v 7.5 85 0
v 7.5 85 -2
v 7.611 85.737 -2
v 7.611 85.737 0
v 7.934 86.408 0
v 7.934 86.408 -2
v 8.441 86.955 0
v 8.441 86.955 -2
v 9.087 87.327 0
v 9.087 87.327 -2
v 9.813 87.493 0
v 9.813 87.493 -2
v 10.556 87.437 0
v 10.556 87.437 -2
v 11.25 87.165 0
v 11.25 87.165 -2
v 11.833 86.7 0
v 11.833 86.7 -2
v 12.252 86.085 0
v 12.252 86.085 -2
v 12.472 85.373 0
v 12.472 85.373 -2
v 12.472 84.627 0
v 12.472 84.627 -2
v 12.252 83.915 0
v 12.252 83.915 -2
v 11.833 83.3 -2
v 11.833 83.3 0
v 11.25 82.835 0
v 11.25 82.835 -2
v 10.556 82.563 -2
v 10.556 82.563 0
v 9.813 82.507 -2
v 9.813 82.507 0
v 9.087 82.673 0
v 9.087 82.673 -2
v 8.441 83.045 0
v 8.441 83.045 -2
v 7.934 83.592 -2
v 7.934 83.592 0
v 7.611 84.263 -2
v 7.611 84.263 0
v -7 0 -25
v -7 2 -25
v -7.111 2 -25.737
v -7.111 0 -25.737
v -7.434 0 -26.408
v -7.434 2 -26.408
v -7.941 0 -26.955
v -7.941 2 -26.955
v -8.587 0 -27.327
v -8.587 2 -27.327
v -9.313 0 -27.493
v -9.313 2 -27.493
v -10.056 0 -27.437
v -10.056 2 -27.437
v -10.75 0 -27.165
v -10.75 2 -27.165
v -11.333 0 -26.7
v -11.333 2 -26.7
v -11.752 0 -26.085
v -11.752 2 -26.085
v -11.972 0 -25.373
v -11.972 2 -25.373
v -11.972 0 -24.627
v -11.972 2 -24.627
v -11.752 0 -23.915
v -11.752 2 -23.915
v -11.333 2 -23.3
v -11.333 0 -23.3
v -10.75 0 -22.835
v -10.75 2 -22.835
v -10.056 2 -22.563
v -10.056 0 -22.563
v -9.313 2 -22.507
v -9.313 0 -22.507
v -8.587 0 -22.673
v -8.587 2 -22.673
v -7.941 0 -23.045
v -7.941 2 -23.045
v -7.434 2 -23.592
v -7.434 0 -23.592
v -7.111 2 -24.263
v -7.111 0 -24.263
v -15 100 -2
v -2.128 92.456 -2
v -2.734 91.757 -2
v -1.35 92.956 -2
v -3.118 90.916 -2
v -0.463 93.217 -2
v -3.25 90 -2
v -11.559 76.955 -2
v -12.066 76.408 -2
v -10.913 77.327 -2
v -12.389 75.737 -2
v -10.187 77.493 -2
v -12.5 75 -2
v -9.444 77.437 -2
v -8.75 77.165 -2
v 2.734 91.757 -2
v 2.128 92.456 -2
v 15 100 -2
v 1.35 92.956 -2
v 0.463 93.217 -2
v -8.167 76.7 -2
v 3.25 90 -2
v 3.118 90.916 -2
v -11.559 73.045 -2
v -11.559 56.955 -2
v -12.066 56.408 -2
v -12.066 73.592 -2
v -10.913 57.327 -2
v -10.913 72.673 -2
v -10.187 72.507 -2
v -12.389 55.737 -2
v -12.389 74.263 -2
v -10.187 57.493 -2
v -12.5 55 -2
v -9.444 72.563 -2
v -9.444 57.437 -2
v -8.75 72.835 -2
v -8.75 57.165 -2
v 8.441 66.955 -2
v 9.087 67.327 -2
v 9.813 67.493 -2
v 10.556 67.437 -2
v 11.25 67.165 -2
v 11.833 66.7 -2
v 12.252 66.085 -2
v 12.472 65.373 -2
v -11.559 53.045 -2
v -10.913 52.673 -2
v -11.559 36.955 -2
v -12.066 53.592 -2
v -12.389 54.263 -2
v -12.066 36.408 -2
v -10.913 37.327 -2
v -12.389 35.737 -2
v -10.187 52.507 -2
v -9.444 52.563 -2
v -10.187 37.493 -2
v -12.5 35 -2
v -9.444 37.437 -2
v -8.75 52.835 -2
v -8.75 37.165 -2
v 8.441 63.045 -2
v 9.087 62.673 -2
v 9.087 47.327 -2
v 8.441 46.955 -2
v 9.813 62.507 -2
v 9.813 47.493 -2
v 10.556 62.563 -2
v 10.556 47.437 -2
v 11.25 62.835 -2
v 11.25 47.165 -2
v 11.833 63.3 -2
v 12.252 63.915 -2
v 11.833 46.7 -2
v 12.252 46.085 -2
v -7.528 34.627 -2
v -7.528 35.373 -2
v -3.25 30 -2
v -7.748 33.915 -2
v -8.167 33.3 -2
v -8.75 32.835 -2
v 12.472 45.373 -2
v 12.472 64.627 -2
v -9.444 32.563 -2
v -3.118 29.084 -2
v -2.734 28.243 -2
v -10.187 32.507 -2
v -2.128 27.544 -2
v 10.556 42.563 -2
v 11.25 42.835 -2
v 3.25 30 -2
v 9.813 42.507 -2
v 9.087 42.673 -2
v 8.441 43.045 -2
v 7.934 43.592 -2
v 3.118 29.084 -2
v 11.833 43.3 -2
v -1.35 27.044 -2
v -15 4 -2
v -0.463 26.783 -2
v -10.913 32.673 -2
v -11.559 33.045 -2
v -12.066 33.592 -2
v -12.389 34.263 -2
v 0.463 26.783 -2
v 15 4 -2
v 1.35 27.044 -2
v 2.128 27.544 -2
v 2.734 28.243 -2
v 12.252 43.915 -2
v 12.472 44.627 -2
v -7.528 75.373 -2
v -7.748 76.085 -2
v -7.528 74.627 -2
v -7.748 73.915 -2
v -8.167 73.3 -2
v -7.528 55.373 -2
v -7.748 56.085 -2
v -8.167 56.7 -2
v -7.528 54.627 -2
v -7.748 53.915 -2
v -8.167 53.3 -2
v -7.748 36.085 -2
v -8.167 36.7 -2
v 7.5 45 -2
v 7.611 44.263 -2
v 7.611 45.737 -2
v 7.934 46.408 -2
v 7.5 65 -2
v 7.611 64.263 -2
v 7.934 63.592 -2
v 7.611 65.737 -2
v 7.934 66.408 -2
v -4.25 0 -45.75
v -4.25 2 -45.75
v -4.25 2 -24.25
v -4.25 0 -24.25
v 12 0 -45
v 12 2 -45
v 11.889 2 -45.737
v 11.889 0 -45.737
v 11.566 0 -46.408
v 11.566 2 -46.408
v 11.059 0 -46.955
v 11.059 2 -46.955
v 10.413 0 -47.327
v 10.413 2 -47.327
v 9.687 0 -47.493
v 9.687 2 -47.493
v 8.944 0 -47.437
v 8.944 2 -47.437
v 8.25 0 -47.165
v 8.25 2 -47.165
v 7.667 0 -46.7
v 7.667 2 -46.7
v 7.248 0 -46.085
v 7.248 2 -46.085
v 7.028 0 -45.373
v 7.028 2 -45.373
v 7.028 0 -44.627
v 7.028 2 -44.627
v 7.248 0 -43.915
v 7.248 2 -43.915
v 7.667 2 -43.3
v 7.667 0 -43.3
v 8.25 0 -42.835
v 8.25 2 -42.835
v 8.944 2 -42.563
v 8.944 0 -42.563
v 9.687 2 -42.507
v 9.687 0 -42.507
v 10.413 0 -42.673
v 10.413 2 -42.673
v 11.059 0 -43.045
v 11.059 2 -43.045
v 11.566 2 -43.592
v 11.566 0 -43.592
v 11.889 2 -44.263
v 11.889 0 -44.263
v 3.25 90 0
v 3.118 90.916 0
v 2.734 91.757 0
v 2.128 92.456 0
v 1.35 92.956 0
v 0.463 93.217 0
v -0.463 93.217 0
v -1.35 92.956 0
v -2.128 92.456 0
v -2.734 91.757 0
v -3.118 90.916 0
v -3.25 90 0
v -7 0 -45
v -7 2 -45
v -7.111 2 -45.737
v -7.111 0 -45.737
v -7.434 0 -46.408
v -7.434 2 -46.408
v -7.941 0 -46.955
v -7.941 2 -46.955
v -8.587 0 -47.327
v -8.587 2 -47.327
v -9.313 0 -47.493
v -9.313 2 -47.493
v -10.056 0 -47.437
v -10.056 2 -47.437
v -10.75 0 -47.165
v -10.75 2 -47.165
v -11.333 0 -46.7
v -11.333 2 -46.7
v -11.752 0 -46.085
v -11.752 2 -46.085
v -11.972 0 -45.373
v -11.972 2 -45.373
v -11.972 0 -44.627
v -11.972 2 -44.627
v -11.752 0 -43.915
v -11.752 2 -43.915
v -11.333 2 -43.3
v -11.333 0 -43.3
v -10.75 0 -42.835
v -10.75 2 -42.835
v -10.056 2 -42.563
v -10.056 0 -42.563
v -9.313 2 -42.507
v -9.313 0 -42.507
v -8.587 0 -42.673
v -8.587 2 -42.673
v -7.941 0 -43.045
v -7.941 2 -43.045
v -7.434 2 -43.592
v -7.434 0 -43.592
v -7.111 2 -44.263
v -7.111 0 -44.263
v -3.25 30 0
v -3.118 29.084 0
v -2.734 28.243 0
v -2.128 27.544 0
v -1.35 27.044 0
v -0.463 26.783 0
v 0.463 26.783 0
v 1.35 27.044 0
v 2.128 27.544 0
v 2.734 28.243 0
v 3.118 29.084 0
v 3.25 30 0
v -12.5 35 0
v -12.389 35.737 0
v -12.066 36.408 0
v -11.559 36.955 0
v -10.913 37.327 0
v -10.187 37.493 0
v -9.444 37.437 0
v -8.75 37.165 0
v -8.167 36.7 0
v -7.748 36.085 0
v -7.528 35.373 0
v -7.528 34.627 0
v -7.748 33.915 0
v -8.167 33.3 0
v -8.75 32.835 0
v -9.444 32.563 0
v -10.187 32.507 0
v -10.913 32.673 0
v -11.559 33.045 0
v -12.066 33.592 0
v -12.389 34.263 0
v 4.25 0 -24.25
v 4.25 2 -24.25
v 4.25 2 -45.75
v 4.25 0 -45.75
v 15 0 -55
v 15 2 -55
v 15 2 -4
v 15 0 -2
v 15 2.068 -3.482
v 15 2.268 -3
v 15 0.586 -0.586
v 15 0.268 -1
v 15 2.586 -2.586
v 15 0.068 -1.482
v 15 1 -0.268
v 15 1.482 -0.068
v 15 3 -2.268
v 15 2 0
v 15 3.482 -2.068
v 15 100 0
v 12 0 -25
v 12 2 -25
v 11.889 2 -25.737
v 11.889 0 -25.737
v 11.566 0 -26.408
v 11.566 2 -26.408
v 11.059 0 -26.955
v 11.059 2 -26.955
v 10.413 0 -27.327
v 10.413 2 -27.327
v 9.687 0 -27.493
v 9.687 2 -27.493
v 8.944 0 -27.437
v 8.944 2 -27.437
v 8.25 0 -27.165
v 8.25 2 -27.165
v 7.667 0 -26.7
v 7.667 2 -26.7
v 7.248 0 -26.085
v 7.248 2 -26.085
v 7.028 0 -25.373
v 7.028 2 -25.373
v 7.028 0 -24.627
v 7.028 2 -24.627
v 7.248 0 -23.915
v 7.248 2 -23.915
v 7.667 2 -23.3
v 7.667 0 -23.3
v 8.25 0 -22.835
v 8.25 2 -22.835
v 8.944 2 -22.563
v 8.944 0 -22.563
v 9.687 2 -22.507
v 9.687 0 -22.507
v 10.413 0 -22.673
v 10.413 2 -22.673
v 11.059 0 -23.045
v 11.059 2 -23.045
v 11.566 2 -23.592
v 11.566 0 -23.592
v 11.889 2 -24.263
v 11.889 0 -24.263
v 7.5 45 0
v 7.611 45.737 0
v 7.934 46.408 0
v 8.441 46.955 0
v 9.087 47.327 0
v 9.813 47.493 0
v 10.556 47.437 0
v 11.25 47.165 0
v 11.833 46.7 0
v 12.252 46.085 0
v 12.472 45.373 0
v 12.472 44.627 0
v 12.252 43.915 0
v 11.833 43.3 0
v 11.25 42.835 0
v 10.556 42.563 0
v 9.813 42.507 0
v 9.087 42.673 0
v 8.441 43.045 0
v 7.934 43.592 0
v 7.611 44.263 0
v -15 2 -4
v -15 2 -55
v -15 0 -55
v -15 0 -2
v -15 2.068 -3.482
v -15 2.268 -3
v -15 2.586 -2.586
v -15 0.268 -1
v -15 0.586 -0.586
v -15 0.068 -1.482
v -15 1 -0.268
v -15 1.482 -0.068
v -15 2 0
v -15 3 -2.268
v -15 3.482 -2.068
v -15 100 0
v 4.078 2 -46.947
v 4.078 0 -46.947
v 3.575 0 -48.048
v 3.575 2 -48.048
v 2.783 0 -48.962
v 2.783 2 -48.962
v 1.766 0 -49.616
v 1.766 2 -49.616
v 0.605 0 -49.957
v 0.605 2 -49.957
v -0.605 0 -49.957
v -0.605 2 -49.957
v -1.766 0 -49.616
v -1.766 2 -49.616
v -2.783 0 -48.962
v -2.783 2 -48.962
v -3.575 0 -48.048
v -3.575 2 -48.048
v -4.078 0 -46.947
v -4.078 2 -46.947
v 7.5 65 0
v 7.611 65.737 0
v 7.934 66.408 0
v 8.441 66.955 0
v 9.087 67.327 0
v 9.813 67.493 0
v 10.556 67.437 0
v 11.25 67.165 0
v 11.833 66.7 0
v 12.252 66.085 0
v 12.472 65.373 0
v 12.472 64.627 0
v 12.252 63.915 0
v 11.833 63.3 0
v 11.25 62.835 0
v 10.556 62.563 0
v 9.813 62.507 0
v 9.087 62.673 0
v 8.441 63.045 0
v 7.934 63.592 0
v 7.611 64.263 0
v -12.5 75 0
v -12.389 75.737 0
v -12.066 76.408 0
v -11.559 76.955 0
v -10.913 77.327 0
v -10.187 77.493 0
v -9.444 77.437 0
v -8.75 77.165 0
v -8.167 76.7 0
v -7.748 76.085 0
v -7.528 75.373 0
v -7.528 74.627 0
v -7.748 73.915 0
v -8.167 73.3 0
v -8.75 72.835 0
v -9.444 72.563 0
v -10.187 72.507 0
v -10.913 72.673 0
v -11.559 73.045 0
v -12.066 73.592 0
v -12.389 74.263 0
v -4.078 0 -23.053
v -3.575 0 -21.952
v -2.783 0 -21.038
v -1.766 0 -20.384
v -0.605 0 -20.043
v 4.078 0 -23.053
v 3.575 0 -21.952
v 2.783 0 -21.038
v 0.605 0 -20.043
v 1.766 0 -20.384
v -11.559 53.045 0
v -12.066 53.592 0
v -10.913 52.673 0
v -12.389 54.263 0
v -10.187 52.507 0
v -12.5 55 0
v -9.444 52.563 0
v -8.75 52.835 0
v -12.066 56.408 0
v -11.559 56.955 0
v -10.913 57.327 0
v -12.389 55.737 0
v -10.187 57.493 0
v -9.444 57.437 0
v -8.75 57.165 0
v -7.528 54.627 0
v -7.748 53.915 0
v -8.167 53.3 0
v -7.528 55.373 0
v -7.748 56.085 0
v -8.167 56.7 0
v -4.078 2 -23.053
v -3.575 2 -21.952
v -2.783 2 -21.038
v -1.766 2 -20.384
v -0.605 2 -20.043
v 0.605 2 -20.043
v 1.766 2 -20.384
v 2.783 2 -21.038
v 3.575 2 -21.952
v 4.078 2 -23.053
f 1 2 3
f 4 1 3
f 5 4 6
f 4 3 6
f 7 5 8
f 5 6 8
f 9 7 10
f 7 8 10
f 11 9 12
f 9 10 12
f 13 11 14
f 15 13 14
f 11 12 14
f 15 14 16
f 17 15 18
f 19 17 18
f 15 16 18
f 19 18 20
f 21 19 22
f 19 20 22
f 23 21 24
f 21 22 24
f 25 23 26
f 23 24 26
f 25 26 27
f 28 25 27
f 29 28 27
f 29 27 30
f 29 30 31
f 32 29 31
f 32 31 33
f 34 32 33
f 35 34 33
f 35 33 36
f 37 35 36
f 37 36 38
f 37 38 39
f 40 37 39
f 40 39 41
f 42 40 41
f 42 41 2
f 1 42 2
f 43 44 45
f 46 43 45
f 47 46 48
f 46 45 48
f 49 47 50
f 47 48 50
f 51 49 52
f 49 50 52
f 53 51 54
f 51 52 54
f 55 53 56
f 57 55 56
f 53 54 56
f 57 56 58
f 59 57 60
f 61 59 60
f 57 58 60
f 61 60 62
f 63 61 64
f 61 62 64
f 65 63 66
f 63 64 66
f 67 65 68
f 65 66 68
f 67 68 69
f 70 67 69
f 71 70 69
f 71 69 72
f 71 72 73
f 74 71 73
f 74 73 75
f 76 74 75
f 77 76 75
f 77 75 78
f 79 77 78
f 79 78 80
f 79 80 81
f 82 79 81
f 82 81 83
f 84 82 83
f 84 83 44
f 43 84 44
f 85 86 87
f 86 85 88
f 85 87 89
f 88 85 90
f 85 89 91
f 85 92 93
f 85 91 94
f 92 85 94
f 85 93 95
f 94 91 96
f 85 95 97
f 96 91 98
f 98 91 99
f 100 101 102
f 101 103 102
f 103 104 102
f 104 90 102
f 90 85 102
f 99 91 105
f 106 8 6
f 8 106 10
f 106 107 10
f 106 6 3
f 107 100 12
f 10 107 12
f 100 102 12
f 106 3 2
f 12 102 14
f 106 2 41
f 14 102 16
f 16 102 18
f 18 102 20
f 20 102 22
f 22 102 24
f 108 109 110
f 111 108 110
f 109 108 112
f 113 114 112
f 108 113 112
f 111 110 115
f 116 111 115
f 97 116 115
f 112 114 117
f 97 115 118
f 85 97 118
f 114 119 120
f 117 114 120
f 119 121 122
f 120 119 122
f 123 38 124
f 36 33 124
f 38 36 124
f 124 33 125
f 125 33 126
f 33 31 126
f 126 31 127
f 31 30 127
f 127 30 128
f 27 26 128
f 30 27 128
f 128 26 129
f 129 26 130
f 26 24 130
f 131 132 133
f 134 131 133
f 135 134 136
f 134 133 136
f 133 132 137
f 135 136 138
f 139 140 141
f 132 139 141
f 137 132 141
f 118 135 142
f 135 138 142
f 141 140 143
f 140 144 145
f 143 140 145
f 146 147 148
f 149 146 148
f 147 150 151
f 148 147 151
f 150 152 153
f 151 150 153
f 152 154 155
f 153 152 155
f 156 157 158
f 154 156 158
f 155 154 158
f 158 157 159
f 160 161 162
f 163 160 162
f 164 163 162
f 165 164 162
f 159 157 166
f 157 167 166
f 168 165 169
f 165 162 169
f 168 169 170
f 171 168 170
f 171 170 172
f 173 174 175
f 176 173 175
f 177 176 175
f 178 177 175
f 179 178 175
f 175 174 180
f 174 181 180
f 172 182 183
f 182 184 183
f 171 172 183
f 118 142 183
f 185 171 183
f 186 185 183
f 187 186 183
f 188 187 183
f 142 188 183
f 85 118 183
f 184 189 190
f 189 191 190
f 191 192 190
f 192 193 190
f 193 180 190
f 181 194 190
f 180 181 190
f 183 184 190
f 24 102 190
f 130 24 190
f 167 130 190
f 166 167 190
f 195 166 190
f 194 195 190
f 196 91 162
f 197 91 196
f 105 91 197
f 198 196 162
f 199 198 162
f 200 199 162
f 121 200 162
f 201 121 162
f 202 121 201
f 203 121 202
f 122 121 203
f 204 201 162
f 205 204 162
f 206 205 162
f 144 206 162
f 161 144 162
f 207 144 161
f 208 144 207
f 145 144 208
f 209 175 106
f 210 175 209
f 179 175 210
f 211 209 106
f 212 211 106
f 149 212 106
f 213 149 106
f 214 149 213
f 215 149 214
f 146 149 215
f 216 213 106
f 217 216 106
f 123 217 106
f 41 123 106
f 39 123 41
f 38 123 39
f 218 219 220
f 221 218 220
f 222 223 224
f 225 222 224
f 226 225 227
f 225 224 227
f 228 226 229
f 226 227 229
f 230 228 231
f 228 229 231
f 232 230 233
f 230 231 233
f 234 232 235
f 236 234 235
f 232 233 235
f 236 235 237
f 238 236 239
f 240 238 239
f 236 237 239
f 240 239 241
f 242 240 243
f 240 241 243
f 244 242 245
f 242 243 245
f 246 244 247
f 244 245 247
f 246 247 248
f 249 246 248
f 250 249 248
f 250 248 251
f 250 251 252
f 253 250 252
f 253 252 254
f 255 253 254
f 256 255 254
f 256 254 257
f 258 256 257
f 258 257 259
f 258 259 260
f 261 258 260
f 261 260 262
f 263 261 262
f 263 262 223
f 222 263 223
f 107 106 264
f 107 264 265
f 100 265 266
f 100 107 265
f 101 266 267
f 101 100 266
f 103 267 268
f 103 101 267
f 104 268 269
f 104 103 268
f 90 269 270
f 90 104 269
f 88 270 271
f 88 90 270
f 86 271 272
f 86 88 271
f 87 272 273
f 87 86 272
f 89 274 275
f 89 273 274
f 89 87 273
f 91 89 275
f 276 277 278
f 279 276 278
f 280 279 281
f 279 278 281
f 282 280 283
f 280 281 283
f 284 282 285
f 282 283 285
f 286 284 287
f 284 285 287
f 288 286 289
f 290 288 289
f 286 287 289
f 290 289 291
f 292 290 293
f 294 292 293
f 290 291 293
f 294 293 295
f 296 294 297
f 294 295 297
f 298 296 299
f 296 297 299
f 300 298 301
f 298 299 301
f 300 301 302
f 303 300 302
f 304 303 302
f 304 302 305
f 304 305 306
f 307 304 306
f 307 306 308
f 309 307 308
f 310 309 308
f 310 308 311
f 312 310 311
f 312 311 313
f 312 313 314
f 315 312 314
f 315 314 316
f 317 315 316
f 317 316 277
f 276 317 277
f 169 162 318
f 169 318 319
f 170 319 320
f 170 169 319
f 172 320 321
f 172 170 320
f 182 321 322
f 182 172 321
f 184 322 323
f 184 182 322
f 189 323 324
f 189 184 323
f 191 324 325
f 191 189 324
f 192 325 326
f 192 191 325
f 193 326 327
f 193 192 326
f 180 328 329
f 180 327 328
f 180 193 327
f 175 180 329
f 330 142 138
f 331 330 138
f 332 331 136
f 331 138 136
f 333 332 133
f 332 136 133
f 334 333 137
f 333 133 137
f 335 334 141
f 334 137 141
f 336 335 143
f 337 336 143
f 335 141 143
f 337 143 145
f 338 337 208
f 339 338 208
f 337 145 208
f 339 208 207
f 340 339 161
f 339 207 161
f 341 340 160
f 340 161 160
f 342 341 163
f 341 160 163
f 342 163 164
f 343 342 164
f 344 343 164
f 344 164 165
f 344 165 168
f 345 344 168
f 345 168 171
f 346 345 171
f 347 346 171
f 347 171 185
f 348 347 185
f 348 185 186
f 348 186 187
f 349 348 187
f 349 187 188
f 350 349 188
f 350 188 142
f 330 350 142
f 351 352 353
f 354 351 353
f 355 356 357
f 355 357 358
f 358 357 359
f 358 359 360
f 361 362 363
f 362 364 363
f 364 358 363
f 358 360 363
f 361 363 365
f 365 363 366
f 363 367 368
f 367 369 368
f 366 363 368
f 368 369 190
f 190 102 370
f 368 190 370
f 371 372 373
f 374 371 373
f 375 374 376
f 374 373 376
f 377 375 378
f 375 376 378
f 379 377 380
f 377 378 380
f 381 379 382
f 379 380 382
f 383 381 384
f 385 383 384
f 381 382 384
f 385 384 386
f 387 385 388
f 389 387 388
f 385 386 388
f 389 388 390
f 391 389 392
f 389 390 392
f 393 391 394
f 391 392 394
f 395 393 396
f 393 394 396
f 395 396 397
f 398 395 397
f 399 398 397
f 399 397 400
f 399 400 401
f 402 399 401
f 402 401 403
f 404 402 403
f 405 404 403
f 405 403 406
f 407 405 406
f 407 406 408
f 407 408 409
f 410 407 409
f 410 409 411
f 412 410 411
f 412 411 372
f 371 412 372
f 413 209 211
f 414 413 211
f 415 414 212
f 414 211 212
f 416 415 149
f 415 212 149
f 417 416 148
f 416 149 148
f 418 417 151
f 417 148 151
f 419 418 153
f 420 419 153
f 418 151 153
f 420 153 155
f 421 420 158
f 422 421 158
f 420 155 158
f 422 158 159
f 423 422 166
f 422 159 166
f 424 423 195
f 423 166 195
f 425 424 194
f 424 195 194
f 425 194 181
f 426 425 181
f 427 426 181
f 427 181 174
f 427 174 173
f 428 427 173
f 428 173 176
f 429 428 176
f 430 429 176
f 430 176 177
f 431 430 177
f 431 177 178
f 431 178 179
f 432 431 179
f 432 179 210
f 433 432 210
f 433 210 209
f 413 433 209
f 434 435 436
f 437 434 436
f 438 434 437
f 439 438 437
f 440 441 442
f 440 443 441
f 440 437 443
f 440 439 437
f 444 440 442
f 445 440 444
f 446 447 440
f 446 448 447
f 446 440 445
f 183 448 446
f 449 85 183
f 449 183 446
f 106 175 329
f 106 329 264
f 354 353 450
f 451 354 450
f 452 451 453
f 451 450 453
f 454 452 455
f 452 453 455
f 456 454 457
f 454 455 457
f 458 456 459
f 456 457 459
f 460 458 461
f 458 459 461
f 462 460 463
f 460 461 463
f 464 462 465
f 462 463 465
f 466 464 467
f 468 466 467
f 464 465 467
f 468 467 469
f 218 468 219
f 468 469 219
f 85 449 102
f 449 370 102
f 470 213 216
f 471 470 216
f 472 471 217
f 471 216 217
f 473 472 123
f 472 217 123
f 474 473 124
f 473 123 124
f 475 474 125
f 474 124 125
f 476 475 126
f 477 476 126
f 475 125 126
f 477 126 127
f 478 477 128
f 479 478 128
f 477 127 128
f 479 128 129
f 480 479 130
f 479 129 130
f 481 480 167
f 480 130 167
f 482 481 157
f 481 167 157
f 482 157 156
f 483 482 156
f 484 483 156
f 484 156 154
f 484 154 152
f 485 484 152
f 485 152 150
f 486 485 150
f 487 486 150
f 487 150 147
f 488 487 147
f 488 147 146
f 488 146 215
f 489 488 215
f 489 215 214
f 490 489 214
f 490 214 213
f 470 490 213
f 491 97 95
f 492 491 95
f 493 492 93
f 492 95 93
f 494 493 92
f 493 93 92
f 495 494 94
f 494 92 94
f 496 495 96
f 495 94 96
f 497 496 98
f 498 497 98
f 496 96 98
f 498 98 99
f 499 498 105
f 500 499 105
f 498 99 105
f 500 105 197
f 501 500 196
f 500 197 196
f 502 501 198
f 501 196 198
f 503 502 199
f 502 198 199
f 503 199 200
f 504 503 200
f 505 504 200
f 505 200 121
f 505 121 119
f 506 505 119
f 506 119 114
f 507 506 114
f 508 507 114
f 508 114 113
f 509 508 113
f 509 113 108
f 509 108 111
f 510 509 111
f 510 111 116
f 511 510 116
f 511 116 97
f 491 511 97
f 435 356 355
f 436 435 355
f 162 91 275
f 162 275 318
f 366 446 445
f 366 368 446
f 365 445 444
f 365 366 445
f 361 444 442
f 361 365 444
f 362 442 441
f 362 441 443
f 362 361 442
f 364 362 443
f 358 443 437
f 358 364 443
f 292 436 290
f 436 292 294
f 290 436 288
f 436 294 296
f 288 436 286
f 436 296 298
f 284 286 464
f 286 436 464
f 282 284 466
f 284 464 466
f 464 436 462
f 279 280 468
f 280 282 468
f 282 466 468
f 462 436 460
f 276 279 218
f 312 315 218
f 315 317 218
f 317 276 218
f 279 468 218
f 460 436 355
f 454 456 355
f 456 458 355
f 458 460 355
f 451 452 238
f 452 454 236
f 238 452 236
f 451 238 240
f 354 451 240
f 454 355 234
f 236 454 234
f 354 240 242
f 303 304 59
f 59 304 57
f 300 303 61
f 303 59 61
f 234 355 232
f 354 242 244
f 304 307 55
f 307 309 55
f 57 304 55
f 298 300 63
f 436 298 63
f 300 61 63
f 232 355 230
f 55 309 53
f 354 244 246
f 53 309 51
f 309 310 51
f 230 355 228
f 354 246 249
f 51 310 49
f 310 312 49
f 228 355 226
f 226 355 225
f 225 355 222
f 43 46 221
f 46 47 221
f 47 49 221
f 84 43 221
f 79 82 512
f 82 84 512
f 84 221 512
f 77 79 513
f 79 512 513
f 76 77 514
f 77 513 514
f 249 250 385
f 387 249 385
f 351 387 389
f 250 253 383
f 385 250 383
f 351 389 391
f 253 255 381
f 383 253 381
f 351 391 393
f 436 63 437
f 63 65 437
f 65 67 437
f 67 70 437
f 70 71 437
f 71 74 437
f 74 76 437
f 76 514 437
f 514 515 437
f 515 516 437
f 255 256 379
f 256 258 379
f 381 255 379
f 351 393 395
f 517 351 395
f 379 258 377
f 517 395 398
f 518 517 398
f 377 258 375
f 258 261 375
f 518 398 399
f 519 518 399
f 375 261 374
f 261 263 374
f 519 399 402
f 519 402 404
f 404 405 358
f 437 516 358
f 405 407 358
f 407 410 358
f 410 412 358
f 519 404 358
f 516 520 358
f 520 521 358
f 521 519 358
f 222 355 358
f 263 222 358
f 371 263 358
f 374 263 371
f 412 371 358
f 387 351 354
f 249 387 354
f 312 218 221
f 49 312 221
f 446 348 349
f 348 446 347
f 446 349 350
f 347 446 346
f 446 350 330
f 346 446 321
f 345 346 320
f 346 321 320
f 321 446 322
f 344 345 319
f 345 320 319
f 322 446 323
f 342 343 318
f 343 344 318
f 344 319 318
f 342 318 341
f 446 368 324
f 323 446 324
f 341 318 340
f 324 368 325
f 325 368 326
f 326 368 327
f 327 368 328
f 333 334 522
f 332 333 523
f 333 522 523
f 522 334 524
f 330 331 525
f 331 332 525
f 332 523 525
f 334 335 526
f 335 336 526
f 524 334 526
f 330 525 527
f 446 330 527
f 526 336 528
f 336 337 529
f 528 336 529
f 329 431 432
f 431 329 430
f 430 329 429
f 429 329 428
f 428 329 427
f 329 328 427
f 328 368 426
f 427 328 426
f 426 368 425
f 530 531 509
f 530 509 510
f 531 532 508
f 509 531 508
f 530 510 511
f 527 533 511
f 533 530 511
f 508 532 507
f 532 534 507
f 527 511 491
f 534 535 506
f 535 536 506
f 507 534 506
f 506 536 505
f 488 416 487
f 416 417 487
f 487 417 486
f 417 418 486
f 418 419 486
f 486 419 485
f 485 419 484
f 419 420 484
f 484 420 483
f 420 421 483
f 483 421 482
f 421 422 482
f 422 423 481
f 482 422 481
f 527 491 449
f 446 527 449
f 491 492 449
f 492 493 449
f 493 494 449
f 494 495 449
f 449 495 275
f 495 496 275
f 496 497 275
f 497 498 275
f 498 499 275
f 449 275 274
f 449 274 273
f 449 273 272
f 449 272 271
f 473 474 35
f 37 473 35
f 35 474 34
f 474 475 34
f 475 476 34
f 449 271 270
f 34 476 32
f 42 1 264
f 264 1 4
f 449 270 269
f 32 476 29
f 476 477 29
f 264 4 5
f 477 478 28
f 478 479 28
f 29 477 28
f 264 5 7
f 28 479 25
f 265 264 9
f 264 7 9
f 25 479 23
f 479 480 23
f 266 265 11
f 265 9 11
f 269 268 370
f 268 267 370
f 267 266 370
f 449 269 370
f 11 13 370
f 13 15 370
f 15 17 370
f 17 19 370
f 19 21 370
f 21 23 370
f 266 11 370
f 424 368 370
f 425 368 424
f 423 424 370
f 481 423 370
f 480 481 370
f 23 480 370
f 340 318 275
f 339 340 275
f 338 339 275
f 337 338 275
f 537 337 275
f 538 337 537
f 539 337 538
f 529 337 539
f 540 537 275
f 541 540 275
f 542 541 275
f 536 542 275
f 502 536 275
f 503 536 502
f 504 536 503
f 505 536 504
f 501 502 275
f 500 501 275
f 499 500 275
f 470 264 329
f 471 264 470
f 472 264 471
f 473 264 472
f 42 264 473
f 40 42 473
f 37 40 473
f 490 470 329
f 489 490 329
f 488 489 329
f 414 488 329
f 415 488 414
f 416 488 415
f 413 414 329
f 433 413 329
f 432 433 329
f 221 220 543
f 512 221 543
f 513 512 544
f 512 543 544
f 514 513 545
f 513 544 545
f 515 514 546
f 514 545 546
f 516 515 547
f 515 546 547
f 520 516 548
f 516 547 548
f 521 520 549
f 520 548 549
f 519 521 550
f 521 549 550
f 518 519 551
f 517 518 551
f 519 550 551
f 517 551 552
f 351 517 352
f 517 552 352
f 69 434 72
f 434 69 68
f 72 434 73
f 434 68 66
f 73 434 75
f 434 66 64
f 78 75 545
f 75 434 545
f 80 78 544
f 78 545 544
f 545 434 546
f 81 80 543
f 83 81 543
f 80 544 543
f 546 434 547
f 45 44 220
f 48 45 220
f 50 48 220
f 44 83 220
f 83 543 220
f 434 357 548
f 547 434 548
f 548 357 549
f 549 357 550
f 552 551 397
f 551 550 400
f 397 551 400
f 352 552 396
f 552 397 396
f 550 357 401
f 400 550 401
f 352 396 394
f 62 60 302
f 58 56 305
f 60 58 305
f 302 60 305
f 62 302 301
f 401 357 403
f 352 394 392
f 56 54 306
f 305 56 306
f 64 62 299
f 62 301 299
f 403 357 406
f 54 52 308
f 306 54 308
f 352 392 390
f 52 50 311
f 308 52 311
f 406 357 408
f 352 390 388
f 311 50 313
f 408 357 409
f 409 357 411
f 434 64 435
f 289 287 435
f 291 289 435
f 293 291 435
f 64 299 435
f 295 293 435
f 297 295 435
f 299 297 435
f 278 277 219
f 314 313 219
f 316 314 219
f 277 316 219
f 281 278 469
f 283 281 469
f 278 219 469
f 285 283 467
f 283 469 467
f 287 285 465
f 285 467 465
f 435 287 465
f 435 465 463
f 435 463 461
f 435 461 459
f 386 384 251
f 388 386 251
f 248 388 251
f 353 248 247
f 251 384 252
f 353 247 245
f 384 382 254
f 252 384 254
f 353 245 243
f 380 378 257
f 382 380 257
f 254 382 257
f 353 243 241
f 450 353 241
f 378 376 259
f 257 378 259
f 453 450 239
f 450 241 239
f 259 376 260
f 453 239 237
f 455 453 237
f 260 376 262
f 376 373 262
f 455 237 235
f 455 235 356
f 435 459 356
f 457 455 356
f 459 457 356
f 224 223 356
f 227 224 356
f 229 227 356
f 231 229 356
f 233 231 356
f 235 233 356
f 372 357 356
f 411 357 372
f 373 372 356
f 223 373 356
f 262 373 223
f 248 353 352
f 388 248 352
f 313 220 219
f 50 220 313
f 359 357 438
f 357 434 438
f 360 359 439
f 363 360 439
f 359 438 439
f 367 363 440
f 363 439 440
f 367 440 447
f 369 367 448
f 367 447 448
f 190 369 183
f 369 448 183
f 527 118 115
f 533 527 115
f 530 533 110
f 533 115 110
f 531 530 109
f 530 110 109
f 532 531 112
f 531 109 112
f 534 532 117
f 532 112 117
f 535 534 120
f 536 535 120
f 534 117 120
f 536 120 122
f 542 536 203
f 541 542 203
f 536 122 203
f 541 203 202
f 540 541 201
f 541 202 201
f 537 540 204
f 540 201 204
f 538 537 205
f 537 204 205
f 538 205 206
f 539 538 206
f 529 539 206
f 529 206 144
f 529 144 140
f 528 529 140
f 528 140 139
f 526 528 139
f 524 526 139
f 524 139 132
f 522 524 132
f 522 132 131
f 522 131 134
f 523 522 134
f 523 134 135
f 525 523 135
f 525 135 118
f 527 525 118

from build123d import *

# Parameters (mm, degrees)
BOSS_EXTRU_1_DEPTH      = 15
CONG_1_R                = 2
ENL_V_MAT_EXTRU_1_REACH = 4
ESQUISSE2_R             = 2.5
ENL_V_MAT_EXTRU_2_REACH = 4
ESQUISSE4_R             = 2.5


with BuildPart() as part:
    # Esquisse1 → Boss.-Extru.1 (new body, symmetric)
    with BuildSketch(Plane(origin=(0, 0, 0), x_dir=(0, 0, -1), z_dir=(1, 0, 0))):
        Polygon((0, 0), (0, 100), (2, 100), (2, 2), (55, 2), (55, 0), align=None)
    extrude(amount=BOSS_EXTRU_1_DEPTH, both=True)

    # Congé1
    cong_1_edges = [part.edges().sort_by_distance(p)[0] for p in [
        (0, 0, 0),
        (0, 2, -2),
    ]]
    fillet(cong_1_edges, radius=CONG_1_R)

    # Esquisse2 → Enlèv. mat.-Extru.1 (cut, up to next)
    with BuildSketch(Plane(origin=(0, 2, 0), x_dir=(1, 0, 0), z_dir=(0, 1, 0)), mode=Mode.PRIVATE) as enl_v_mat_extru_1_sk1:
        with BuildLine():
            Line((4.25, 24.25), (4.25, 45.75))
            ThreePointArc((4.25, 45.75), (0, 50), (-4.25, 45.75))
            Line((-4.25, 45.75), (-4.25, 24.25))
            ThreePointArc((-4.25, 24.25), (0, 20), (4.25, 24.25))
        make_face()
    enl_v_mat_extru_1_tool1 = extrude(enl_v_mat_extru_1_sk1.sketch, amount=-ENL_V_MAT_EXTRU_1_REACH, mode=Mode.PRIVATE) & part.part
    add(enl_v_mat_extru_1_tool1.solids().sort_by_distance((0, 2, -35))[0], mode=Mode.SUBTRACT)
    # Esquisse2 → Enlèv. mat.-Extru.1 (cut, up to next)
    with BuildSketch(Plane(origin=(0, 2, 0), x_dir=(1, 0, 0), z_dir=(0, 1, 0)), mode=Mode.PRIVATE) as enl_v_mat_extru_1_sk2:
        with Locations((-9.5, 25)):
            Circle(ESQUISSE2_R)
    enl_v_mat_extru_1_tool2 = extrude(enl_v_mat_extru_1_sk2.sketch, amount=-ENL_V_MAT_EXTRU_1_REACH, mode=Mode.PRIVATE) & part.part
    add(enl_v_mat_extru_1_tool2.solids().sort_by_distance((-9.5, 2, -25))[0], mode=Mode.SUBTRACT)
    # Esquisse2 → Enlèv. mat.-Extru.1 (cut, up to next)
    with BuildSketch(Plane(origin=(0, 2, 0), x_dir=(1, 0, 0), z_dir=(0, 1, 0)), mode=Mode.PRIVATE) as enl_v_mat_extru_1_sk3:
        with Locations((-9.5, 45)):
            Circle(ESQUISSE2_R)
    enl_v_mat_extru_1_tool3 = extrude(enl_v_mat_extru_1_sk3.sketch, amount=-ENL_V_MAT_EXTRU_1_REACH, mode=Mode.PRIVATE) & part.part
    add(enl_v_mat_extru_1_tool3.solids().sort_by_distance((-9.5, 2, -45))[0], mode=Mode.SUBTRACT)
    # Esquisse2 → Enlèv. mat.-Extru.1 (cut, up to next)
    with BuildSketch(Plane(origin=(0, 2, 0), x_dir=(1, 0, 0), z_dir=(0, 1, 0)), mode=Mode.PRIVATE) as enl_v_mat_extru_1_sk4:
        with Locations((9.5, 45)):
            Circle(ESQUISSE2_R)
    enl_v_mat_extru_1_tool4 = extrude(enl_v_mat_extru_1_sk4.sketch, amount=-ENL_V_MAT_EXTRU_1_REACH, mode=Mode.PRIVATE) & part.part
    add(enl_v_mat_extru_1_tool4.solids().sort_by_distance((9.5, 2, -45))[0], mode=Mode.SUBTRACT)
    # Esquisse2 → Enlèv. mat.-Extru.1 (cut, up to next)
    with BuildSketch(Plane(origin=(0, 2, 0), x_dir=(1, 0, 0), z_dir=(0, 1, 0)), mode=Mode.PRIVATE) as enl_v_mat_extru_1_sk5:
        with Locations((9.5, 25)):
            Circle(ESQUISSE2_R)
    enl_v_mat_extru_1_tool5 = extrude(enl_v_mat_extru_1_sk5.sketch, amount=-ENL_V_MAT_EXTRU_1_REACH, mode=Mode.PRIVATE) & part.part
    add(enl_v_mat_extru_1_tool5.solids().sort_by_distance((9.5, 2, -25))[0], mode=Mode.SUBTRACT)

    # Esquisse4 → Enlèv. mat.-Extru.2 (cut, up to next)
    with BuildSketch(Plane(origin=(0, 0, -2), x_dir=(-1, 0, 0), z_dir=(0, 0, -1)), mode=Mode.PRIVATE) as enl_v_mat_extru_2_sk1:
        with Locations((-10, 85)):
            Circle(ESQUISSE4_R)
    enl_v_mat_extru_2_tool1 = extrude(enl_v_mat_extru_2_sk1.sketch, amount=-ENL_V_MAT_EXTRU_2_REACH, mode=Mode.PRIVATE) & part.part
    add(enl_v_mat_extru_2_tool1.solids().sort_by_distance((10, 85, -2))[0], mode=Mode.SUBTRACT)
    # Esquisse4 → Enlèv. mat.-Extru.2 (cut, up to next)
    with BuildSketch(Plane(origin=(0, 0, -2), x_dir=(-1, 0, 0), z_dir=(0, 0, -1)), mode=Mode.PRIVATE) as enl_v_mat_extru_2_sk2:
        with Locations((-10, 65)):
            Circle(ESQUISSE4_R)
    enl_v_mat_extru_2_tool2 = extrude(enl_v_mat_extru_2_sk2.sketch, amount=-ENL_V_MAT_EXTRU_2_REACH, mode=Mode.PRIVATE) & part.part
    add(enl_v_mat_extru_2_tool2.solids().sort_by_distance((10, 65, -2))[0], mode=Mode.SUBTRACT)
    # Esquisse4 → Enlèv. mat.-Extru.2 (cut, up to next)
    with BuildSketch(Plane(origin=(0, 0, -2), x_dir=(-1, 0, 0), z_dir=(0, 0, -1)), mode=Mode.PRIVATE) as enl_v_mat_extru_2_sk3:
        with Locations((-10, 45)):
            Circle(ESQUISSE4_R)
    enl_v_mat_extru_2_tool3 = extrude(enl_v_mat_extru_2_sk3.sketch, amount=-ENL_V_MAT_EXTRU_2_REACH, mode=Mode.PRIVATE) & part.part
    add(enl_v_mat_extru_2_tool3.solids().sort_by_distance((10, 45, -2))[0], mode=Mode.SUBTRACT)
    # Esquisse4 → Enlèv. mat.-Extru.2 (cut, up to next)
    with BuildSketch(Plane(origin=(0, 0, -2), x_dir=(-1, 0, 0), z_dir=(0, 0, -1)), mode=Mode.PRIVATE) as enl_v_mat_extru_2_sk4:
        with Locations((10, 75)):
            Circle(ESQUISSE4_R)
    enl_v_mat_extru_2_tool4 = extrude(enl_v_mat_extru_2_sk4.sketch, amount=-ENL_V_MAT_EXTRU_2_REACH, mode=Mode.PRIVATE) & part.part
    add(enl_v_mat_extru_2_tool4.solids().sort_by_distance((-10, 75, -2))[0], mode=Mode.SUBTRACT)
    # Esquisse4 → Enlèv. mat.-Extru.2 (cut, up to next)
    with BuildSketch(Plane(origin=(0, 0, -2), x_dir=(-1, 0, 0), z_dir=(0, 0, -1)), mode=Mode.PRIVATE) as enl_v_mat_extru_2_sk5:
        with Locations((10, 55)):
            Circle(ESQUISSE4_R)
    enl_v_mat_extru_2_tool5 = extrude(enl_v_mat_extru_2_sk5.sketch, amount=-ENL_V_MAT_EXTRU_2_REACH, mode=Mode.PRIVATE) & part.part
    add(enl_v_mat_extru_2_tool5.solids().sort_by_distance((-10, 55, -2))[0], mode=Mode.SUBTRACT)
    # Esquisse4 → Enlèv. mat.-Extru.2 (cut, up to next)
    with BuildSketch(Plane(origin=(0, 0, -2), x_dir=(-1, 0, 0), z_dir=(0, 0, -1)), mode=Mode.PRIVATE) as enl_v_mat_extru_2_sk6:
        with Locations((10, 35)):
            Circle(ESQUISSE4_R)
    enl_v_mat_extru_2_tool6 = extrude(enl_v_mat_extru_2_sk6.sketch, amount=-ENL_V_MAT_EXTRU_2_REACH, mode=Mode.PRIVATE) & part.part
    add(enl_v_mat_extru_2_tool6.solids().sort_by_distance((-10, 35, -2))[0], mode=Mode.SUBTRACT)
    # Esquisse4 → Enlèv. mat.-Extru.2 (cut, up to next)
    with BuildSketch(Plane(origin=(0, 0, -2), x_dir=(-1, 0, 0), z_dir=(0, 0, -1)), mode=Mode.PRIVATE) as enl_v_mat_extru_2_sk7:
        with BuildLine():
            Line((3.25, 90), (3.25, 30))
            ThreePointArc((3.25, 30), (0, 26.75), (-3.25, 30))
            Line((-3.25, 30), (-3.25, 90))
            ThreePointArc((-3.25, 90), (0, 93.25), (3.25, 90))
        make_face()
    enl_v_mat_extru_2_tool7 = extrude(enl_v_mat_extru_2_sk7.sketch, amount=-ENL_V_MAT_EXTRU_2_REACH, mode=Mode.PRIVATE) & part.part
    add(enl_v_mat_extru_2_tool7.solids().sort_by_distance((0, 60, -2))[0], mode=Mode.SUBTRACT)


solid = part.part
